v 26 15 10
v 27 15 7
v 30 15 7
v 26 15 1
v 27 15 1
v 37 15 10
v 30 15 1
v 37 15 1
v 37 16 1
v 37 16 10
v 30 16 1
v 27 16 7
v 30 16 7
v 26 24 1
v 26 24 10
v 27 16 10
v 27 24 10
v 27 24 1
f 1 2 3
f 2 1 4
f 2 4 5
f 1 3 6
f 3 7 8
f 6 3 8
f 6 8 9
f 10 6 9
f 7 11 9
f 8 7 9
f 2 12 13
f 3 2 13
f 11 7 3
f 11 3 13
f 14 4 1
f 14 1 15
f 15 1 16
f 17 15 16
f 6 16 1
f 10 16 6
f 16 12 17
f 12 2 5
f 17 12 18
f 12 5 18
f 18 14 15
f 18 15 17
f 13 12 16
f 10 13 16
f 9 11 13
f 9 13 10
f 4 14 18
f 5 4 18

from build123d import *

# Parameters (mm, degrees)
BOX012_W     = 1
BOX012_H     = 9
BOX012_DEPTH = 9
BOX011_W     = 7
BOX011_H     = 1
BOX011_DEPTH = 9
BOX013_W     = 3
BOX013_H     = 1
BOX013_DEPTH = 3


with BuildPart() as box012:
    # Box012 → Box012 (new body)
    with BuildSketch(Plane(origin=(33, 15, 1), x_dir=(1, 0, 0), z_dir=(0, 0, 1))):
        with Locations((0.5, 4.5)):
            Rectangle(BOX012_W, BOX012_H)
    extrude(amount=BOX012_DEPTH)


with BuildPart() as box011:
    # Box011 → Box011 (new body)
    with BuildSketch(Plane(origin=(37, 15, 1), x_dir=(1, 0, 0), z_dir=(0, 0, 1))):
        with Locations((3.5, 0.5)):
            Rectangle(BOX011_W, BOX011_H)
    extrude(amount=BOX011_DEPTH)


with BuildPart() as fusion003:
    # Box013 → Box013 (new body)
    with BuildSketch(Plane(origin=(34, 15, 7), x_dir=(1, 0, 0), z_dir=(0, 0, 1))):
        with Locations((1.5, 0.5)):
            Rectangle(BOX013_W, BOX013_H)
    extrude(amount=BOX013_DEPTH)

    # Fusion003: union Box012, Box011
    add(box012.part)
    add(box011.part)


with BuildPart() as fusion003_1:
    # Fusion003 placement: moved
    add(fusion003.part.moved(Location((-7, 0, 0))))


solid = fusion003_1.part
